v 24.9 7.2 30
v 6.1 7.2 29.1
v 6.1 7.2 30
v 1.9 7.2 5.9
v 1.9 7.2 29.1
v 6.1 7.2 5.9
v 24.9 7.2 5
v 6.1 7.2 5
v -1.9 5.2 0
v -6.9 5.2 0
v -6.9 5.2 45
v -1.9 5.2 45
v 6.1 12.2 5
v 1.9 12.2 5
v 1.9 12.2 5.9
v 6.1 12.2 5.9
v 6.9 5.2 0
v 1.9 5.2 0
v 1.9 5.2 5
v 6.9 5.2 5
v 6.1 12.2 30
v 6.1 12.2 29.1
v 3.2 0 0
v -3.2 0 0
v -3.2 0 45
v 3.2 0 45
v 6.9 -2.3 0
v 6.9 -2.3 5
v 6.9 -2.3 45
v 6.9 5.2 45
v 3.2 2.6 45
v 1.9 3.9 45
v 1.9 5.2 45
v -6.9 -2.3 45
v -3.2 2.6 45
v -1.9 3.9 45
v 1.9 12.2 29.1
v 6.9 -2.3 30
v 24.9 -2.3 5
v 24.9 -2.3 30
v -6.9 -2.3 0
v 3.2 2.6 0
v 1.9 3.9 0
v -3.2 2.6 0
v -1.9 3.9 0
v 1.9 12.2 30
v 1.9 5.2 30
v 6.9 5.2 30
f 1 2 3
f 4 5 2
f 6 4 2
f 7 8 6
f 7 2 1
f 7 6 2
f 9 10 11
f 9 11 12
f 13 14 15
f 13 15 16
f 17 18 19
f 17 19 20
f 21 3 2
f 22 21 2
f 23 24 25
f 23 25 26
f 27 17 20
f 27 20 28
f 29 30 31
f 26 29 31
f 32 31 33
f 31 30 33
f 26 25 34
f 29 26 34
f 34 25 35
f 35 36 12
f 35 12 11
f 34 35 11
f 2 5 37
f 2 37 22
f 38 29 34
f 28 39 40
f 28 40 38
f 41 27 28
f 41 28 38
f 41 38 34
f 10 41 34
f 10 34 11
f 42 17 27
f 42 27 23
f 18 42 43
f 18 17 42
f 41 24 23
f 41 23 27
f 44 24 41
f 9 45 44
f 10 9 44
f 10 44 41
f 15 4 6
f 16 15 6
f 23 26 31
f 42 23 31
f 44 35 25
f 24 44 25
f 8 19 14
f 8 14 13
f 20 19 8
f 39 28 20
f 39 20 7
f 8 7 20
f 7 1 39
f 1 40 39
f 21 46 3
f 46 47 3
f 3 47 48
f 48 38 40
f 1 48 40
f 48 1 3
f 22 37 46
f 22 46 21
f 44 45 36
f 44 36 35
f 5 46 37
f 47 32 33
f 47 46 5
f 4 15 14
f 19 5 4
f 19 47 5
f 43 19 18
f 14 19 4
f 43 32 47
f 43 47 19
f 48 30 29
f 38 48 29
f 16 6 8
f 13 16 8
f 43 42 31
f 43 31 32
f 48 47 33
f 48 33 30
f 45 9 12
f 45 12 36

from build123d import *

# Parameters (mm, degrees)
BOSS_EXTRU_1_DEPTH = 45
ESQUISSE6_W        = 25
ESQUISSE6_H        = 7.5
BOSS_EXTRU_6_DEPTH = 18
ESQUISSE7_W        = 23
ESQUISSE7_H        = 25
BOSS_EXTRU_7_DEPTH = 2
ESQUISSE8_W        = 4.2
ESQUISSE8_H        = 0.9
BOSS_EXTRU_8_DEPTH = 5


with BuildPart() as part:
    # Esquisse1 → Boss.-Extru.1 (new body)
    with BuildSketch(Plane.XY):
        Polygon((-3.2, 0), (3.2, 0), (3.2, 2.6), (1.9, 3.9), (1.9, 5.2), (6.9, 5.2), (6.9, -2.3), (-6.9, -2.3), (-6.9, 5.2), (-1.9, 5.2), (-1.9, 3.9), (-3.2, 2.6), align=None)
    extrude(amount=BOSS_EXTRU_1_DEPTH)

    # Esquisse6 → Boss.-Extru.6 (add)
    with BuildSketch(Plane(origin=(6.9, 0, 0), x_dir=(0, 0, -1), z_dir=(1, 0, 0))):
        with Locations((-17.5, 1.45)):
            Rectangle(ESQUISSE6_W, ESQUISSE6_H)
    extrude(amount=BOSS_EXTRU_6_DEPTH)

    # Esquisse7 → Boss.-Extru.7 (add)
    with BuildSketch(Plane(origin=(0, 5.2, 0), x_dir=(1, 0, 0), z_dir=(0, 1, 0))):
        with Locations((13.4, -17.5)):
            Rectangle(ESQUISSE7_W, ESQUISSE7_H)
    extrude(amount=BOSS_EXTRU_7_DEPTH)

    # Esquisse8 → Boss.-Extru.8 (add)
    with BuildSketch(Plane(origin=(0, 7.2, 0), x_dir=(1, 0, 0), z_dir=(0, 1, 0))):
        with Locations((4, -29.55)):
            Rectangle(ESQUISSE8_W, ESQUISSE8_H)
        with Locations((4, -5.45)):
            Rectangle(ESQUISSE8_W, ESQUISSE8_H)
    extrude(amount=BOSS_EXTRU_8_DEPTH)


solid = part.part
